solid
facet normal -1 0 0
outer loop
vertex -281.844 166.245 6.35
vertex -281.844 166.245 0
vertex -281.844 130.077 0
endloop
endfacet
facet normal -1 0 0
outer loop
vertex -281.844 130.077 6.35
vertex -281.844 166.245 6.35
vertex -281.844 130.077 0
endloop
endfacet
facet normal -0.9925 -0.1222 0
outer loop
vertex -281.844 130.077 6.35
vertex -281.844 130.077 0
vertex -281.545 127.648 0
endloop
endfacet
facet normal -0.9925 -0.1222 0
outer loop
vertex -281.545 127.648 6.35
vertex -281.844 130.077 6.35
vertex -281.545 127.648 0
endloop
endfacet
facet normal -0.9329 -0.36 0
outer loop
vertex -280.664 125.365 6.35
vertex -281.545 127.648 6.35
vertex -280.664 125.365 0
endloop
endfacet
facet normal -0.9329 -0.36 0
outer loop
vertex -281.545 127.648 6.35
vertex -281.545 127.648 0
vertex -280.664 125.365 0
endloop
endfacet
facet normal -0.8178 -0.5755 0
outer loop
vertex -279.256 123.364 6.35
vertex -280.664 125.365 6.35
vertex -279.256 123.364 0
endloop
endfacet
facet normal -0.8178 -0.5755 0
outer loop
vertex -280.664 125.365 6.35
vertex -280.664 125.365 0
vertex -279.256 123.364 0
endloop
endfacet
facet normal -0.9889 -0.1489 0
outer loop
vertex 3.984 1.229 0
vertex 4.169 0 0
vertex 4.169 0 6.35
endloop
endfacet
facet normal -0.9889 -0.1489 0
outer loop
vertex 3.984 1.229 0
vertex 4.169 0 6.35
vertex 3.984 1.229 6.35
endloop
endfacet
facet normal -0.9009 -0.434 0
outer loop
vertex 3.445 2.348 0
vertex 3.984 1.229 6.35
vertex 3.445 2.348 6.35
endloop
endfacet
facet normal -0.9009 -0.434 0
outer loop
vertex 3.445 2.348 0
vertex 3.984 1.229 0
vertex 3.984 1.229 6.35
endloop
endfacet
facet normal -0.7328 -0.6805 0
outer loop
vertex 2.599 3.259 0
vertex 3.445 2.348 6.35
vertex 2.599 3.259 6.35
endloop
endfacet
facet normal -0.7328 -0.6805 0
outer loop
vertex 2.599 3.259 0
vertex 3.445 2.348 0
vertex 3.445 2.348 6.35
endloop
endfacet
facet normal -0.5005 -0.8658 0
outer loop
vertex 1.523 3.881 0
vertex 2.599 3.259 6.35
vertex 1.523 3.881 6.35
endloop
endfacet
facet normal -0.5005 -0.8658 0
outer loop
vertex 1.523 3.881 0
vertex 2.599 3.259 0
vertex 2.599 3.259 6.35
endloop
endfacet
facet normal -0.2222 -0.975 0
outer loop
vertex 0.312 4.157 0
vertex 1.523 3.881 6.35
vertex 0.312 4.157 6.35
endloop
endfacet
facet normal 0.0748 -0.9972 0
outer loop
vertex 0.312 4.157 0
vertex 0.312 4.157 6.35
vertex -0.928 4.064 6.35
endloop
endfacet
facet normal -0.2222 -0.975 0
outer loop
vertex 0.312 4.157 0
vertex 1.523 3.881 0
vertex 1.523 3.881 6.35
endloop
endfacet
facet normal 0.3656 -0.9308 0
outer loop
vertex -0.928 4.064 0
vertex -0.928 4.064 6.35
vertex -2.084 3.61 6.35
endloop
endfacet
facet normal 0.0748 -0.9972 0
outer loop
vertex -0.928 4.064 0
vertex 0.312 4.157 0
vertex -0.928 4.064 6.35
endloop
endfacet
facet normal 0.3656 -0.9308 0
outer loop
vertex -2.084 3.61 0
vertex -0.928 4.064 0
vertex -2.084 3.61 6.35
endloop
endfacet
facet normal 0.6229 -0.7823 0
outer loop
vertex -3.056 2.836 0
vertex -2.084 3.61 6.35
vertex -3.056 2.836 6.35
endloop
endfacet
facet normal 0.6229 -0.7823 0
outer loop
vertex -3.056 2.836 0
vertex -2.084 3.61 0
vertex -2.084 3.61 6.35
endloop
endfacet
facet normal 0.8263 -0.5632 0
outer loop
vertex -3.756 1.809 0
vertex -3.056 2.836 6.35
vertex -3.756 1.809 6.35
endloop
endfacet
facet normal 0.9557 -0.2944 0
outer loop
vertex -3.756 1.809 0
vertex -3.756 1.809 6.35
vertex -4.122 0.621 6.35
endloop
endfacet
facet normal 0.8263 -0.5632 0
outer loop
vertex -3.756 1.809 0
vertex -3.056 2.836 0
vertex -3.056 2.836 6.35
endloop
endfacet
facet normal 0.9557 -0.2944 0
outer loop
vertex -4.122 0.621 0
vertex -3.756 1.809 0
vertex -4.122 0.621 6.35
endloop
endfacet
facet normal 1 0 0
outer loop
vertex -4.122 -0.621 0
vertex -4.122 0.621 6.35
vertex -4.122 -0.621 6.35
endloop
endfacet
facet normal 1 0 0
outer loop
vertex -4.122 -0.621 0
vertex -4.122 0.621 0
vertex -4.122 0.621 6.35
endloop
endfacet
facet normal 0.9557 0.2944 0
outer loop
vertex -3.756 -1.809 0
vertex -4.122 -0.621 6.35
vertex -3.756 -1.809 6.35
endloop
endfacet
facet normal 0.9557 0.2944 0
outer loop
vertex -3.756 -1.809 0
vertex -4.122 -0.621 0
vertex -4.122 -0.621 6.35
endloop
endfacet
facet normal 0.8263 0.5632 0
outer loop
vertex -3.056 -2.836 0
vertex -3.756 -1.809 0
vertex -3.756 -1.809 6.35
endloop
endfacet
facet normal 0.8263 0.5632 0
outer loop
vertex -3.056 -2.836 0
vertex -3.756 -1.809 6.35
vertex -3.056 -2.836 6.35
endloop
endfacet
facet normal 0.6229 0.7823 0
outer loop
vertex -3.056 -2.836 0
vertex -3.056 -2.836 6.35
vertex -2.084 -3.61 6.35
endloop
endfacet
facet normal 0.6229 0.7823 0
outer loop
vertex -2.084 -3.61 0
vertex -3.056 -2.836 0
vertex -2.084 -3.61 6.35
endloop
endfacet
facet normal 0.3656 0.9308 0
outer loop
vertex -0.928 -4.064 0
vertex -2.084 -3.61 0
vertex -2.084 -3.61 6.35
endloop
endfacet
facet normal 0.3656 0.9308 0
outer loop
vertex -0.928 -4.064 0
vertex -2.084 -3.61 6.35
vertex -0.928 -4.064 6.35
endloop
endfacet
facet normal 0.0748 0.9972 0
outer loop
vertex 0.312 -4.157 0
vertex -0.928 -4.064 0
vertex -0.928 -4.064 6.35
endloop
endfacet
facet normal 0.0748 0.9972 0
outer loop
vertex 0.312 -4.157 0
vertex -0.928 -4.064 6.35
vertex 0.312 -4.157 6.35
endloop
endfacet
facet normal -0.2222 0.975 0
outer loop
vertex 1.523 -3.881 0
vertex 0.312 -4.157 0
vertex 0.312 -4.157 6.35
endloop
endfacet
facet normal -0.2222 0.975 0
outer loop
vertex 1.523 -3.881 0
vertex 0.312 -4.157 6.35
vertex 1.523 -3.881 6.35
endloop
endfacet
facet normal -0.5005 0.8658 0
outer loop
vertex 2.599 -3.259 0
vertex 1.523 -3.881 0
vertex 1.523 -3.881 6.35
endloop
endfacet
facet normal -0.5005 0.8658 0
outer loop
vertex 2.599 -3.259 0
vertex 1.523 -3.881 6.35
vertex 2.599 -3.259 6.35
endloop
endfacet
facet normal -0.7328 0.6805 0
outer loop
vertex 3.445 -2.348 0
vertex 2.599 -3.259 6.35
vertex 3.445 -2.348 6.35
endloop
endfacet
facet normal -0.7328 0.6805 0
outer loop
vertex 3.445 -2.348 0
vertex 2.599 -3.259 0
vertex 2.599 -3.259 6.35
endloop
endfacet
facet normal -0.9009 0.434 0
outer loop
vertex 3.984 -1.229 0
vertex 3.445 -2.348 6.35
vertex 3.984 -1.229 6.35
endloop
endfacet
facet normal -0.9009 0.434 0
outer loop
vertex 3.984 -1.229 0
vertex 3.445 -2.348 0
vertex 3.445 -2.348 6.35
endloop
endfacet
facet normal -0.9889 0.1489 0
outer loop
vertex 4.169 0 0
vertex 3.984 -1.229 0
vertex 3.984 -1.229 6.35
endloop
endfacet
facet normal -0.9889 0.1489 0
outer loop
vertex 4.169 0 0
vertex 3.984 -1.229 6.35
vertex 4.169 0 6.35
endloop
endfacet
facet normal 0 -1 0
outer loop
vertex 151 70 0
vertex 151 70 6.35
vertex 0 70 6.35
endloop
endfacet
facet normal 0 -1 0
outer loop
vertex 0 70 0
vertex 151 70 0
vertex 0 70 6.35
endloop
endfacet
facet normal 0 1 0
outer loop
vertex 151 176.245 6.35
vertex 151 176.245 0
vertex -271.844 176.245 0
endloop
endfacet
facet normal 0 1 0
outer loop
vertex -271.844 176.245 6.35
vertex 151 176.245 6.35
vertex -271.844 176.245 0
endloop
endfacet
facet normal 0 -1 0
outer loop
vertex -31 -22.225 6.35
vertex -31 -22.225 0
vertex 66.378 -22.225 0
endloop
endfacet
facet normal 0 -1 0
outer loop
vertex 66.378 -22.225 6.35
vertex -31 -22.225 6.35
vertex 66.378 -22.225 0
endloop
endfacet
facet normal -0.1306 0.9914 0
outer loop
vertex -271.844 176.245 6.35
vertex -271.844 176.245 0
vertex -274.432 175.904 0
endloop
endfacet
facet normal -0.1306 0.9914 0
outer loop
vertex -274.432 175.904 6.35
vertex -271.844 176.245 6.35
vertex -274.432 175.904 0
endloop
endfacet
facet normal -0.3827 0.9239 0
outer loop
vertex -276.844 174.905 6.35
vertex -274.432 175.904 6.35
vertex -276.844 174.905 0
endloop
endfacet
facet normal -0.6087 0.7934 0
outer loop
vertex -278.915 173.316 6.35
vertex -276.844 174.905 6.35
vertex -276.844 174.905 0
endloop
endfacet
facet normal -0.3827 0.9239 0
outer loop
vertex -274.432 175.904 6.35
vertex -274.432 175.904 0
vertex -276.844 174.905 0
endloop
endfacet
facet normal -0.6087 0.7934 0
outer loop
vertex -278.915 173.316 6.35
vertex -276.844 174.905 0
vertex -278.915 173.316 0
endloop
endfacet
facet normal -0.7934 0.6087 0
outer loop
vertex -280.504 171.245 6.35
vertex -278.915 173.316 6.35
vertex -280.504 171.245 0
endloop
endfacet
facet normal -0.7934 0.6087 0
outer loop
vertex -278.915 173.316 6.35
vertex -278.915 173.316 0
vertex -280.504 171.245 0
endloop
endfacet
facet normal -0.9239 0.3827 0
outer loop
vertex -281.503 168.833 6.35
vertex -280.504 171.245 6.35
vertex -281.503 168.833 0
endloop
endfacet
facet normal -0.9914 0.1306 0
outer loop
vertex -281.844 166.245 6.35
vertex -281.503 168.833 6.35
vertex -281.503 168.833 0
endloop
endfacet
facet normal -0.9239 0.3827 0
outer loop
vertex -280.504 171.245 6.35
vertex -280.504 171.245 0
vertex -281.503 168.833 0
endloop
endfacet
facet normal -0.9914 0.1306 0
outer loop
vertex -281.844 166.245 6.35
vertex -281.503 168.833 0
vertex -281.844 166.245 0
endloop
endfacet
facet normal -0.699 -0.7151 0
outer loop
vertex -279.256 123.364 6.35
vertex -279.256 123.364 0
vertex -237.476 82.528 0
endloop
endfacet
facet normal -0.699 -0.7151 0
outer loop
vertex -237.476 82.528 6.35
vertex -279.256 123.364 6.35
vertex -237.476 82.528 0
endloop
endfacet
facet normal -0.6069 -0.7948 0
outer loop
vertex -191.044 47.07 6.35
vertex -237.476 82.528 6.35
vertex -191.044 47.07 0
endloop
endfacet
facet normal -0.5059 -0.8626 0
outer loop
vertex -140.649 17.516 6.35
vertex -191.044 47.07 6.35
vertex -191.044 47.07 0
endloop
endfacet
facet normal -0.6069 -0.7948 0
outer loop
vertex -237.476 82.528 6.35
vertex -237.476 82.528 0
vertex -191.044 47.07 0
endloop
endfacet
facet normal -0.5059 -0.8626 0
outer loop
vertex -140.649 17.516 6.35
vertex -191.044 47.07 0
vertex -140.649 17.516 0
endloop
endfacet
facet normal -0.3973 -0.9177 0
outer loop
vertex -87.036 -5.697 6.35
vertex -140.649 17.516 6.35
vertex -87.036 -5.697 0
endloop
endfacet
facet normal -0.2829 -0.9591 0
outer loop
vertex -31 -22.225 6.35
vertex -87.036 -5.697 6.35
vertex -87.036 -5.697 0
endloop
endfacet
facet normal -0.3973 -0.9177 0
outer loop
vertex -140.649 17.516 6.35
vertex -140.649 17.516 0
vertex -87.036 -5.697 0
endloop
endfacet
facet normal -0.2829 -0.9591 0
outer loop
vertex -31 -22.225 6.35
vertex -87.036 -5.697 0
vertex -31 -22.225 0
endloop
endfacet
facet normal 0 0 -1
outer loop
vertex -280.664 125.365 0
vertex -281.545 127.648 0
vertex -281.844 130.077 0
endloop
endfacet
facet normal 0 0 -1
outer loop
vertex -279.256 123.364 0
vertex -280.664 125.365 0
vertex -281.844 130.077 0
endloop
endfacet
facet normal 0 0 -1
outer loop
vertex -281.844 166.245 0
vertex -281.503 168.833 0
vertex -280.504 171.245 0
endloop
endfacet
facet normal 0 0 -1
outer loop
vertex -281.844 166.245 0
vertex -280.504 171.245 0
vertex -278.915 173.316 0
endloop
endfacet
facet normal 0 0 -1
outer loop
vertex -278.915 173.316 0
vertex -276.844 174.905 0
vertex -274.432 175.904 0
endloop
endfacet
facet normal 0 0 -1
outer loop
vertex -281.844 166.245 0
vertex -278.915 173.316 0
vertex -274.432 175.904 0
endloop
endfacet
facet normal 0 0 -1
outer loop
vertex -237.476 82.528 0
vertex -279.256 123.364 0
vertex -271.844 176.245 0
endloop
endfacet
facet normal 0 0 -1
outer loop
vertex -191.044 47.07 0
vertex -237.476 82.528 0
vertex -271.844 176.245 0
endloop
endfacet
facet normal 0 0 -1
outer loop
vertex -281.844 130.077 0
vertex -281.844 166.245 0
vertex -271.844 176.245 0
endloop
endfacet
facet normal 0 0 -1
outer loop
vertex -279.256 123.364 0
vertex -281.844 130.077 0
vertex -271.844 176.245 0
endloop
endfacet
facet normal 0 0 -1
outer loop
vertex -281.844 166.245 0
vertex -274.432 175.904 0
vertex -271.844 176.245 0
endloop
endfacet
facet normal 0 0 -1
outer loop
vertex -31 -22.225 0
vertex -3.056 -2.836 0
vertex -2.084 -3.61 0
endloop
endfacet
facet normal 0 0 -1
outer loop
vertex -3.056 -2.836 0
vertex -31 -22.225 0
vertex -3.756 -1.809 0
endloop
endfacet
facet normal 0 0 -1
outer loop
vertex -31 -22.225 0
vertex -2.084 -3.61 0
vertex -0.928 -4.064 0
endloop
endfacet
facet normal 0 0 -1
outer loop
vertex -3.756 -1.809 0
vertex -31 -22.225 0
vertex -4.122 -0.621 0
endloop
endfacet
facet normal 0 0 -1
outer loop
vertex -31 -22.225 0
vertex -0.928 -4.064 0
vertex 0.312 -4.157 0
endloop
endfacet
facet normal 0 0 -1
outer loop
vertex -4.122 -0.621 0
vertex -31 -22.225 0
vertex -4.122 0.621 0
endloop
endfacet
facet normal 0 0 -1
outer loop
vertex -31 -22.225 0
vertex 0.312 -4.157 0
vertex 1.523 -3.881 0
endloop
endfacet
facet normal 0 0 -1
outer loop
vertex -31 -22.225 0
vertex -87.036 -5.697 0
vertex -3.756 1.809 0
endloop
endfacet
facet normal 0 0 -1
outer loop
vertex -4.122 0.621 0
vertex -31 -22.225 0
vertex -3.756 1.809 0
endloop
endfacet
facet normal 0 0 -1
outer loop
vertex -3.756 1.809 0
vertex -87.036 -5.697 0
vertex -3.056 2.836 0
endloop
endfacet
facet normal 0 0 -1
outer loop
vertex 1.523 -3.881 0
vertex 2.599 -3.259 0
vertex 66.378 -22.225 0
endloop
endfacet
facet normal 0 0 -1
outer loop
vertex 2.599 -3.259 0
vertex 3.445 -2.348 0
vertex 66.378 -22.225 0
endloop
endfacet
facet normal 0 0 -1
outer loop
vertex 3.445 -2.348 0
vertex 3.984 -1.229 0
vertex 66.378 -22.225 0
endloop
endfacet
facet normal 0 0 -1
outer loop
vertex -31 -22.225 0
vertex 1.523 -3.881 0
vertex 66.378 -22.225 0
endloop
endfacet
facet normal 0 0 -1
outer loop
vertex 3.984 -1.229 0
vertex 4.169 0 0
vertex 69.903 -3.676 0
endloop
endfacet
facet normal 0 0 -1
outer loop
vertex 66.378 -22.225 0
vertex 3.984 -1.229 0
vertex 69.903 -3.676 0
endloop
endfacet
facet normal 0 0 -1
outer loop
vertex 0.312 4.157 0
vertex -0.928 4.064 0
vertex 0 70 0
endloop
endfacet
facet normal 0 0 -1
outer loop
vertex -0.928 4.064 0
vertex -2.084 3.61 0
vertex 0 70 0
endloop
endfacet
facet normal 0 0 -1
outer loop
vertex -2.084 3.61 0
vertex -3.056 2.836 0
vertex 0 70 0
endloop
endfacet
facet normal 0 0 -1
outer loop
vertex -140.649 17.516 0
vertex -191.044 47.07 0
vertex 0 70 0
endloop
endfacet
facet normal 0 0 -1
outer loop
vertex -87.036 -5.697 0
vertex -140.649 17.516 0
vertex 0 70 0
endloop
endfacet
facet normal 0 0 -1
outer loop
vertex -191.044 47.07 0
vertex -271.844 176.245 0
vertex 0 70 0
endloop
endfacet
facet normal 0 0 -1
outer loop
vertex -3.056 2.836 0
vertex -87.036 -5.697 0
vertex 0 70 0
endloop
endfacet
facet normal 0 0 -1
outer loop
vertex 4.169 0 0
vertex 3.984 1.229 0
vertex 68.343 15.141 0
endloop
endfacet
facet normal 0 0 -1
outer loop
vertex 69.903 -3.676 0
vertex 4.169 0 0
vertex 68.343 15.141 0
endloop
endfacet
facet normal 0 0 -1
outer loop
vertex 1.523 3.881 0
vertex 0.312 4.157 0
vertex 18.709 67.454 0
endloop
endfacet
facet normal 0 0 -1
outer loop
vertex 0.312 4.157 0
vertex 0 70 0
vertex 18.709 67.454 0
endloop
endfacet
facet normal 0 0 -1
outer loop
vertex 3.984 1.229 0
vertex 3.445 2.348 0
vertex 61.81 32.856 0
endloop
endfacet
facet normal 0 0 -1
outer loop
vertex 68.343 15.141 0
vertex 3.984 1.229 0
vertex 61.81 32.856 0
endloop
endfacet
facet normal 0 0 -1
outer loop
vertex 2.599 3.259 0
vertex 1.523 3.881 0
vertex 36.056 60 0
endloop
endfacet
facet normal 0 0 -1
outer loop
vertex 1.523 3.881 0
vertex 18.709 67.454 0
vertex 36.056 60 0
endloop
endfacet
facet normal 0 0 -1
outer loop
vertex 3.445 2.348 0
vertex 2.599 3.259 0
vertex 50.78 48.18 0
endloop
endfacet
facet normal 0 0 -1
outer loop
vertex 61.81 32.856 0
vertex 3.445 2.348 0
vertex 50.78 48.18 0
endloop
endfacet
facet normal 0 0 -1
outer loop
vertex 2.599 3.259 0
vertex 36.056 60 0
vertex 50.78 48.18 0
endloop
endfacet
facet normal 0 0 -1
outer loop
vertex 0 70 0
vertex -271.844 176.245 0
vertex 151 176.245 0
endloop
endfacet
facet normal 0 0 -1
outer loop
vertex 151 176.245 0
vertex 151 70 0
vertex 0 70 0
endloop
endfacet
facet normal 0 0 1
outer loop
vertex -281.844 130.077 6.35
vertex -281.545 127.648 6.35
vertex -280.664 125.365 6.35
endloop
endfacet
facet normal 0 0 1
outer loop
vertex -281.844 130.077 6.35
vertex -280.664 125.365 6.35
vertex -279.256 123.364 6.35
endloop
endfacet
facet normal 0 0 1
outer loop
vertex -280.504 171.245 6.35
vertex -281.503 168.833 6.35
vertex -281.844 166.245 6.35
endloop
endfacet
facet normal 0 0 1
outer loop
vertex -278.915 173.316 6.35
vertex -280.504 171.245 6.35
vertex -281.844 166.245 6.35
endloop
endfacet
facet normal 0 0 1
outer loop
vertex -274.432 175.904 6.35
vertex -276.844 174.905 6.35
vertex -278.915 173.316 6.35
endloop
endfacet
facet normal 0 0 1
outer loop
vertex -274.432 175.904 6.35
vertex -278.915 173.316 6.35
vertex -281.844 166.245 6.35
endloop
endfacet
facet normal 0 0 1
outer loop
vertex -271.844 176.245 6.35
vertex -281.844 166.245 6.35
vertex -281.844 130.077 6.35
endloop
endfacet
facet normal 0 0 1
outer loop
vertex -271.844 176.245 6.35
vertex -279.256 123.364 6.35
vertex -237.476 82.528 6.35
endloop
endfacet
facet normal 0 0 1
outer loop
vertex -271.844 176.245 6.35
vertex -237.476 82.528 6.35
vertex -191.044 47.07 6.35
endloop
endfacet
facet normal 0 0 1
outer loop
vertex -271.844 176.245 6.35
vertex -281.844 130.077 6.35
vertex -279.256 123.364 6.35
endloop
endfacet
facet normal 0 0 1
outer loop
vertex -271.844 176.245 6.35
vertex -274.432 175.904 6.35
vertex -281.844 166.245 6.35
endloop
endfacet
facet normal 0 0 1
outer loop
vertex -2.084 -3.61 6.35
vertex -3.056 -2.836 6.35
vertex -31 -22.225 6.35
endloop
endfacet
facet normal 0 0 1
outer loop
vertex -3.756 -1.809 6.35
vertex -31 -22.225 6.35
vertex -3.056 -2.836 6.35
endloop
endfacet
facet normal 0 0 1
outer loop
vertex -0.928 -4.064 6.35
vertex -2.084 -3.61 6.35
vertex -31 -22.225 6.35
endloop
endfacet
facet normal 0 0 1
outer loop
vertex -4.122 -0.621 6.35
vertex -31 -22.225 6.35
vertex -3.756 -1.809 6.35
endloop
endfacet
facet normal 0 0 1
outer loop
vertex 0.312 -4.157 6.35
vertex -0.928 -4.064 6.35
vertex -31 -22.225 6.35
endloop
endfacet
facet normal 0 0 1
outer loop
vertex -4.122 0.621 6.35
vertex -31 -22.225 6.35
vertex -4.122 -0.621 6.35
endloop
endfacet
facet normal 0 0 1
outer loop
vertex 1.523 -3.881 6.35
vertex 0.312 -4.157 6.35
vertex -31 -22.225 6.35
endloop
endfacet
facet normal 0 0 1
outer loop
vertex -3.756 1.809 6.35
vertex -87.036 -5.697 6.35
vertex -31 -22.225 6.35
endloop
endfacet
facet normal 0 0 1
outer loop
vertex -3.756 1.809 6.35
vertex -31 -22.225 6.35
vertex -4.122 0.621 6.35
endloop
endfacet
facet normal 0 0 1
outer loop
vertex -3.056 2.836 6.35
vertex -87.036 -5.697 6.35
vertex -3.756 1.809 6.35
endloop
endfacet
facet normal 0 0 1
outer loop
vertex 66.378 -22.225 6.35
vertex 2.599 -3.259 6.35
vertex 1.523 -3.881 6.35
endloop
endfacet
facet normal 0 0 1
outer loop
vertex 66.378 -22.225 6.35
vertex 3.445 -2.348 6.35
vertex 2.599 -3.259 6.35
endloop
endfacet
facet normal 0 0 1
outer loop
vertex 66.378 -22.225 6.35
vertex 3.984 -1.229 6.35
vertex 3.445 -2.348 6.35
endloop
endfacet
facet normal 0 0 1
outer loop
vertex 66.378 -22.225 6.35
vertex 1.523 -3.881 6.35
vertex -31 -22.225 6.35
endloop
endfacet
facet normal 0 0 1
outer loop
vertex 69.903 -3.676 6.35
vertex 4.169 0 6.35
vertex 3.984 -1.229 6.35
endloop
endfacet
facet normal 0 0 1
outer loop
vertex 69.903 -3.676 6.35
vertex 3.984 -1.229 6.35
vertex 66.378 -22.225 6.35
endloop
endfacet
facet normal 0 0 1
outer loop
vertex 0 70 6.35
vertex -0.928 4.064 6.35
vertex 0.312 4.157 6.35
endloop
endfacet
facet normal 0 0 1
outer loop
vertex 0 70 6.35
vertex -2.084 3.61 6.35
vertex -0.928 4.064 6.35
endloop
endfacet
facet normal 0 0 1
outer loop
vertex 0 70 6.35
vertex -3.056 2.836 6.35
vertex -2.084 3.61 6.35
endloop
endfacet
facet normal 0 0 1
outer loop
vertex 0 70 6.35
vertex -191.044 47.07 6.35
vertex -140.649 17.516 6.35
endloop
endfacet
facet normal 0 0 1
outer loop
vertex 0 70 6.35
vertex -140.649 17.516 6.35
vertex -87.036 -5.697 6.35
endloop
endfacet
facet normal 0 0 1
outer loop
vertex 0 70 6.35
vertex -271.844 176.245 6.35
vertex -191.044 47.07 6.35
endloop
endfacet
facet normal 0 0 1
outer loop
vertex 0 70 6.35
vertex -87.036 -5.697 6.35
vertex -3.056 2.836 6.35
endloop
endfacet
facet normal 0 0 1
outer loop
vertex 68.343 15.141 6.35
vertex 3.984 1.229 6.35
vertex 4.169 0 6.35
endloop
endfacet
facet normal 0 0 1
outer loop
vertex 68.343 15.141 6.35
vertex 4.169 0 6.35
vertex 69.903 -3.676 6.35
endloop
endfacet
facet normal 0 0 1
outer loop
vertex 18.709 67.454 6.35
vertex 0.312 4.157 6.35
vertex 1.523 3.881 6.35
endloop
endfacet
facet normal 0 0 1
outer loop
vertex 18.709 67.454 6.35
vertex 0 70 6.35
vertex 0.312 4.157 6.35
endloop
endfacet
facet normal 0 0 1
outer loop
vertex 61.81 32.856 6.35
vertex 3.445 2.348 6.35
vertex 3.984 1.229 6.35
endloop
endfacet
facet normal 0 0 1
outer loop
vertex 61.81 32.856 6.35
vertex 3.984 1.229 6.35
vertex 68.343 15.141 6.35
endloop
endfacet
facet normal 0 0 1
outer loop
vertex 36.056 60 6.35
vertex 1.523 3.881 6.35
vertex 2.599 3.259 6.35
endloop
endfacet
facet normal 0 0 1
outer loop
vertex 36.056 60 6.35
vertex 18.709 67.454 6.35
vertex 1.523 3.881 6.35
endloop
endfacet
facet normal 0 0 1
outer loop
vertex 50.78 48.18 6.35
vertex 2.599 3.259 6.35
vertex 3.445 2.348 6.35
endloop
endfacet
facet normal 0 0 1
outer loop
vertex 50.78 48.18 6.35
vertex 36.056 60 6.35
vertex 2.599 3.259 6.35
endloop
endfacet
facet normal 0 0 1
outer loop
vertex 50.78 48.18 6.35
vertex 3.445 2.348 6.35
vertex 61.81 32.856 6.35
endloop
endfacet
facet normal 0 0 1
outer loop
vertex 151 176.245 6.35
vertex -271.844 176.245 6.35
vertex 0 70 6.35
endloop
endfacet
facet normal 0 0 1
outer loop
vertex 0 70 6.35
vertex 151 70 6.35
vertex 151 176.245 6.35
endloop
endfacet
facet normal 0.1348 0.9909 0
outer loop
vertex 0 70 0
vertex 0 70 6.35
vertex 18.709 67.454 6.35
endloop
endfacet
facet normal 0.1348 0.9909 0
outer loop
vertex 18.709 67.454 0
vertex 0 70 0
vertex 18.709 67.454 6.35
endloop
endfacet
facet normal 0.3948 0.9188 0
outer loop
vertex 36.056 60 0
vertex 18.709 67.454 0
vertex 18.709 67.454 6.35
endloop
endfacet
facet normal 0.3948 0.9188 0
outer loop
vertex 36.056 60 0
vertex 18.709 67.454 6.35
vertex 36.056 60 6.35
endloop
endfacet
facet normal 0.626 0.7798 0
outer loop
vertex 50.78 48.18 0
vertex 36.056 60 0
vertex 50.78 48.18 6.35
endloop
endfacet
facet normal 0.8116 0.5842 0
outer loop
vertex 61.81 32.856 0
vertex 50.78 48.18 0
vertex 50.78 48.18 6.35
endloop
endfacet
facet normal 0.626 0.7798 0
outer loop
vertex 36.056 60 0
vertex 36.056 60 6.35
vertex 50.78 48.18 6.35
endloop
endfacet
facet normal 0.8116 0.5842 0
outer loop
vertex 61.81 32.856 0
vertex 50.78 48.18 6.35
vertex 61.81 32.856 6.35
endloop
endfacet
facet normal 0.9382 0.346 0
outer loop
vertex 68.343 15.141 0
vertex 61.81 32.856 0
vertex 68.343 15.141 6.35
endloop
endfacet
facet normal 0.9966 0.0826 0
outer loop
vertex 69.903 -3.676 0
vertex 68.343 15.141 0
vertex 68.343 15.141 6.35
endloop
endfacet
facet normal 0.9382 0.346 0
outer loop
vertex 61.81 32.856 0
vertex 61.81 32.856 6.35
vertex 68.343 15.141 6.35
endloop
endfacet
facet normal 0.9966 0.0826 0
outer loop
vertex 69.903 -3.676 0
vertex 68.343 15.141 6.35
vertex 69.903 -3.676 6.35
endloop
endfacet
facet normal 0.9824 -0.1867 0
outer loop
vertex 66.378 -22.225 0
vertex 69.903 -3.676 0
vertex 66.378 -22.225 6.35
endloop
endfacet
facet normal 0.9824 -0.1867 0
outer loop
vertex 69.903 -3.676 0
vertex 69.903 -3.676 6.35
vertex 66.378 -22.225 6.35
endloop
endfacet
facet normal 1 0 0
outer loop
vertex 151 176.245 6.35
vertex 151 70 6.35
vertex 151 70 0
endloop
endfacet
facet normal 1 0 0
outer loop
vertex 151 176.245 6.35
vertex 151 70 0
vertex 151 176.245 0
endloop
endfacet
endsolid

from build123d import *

# Parameters (mm, degrees)
CROQUIS1_W              = 62
CROQUIS1_H              = 44.45
CROQUIS1_R              = 4.168993309
SALIENTE_EXTRUIR1_DEPTH = 6.35
CORTAR_EXTRUIR1_DEPTH   = 6.35
CROQUIS4_W              = 501.85323645
CROQUIS4_H              = 287.183942178
CORTAR_EXTRUIR2_DEPTH   = 6.35


with BuildPart() as part:
    # Croquis1 → Saliente-Extruir1 (new body)
    # profile 1 of 2: a face of its own
    with BuildSketch(Plane.XY):
        with BuildLine():
            Line((31, 22.225), (31, -22.225))
            Line((31, -22.225), (333, -22.225))
            ThreePointArc((333, -22.225), (468.296416477, 31.525514455), (581.256141711, 123.364169664))
            ThreePointArc((581.256141711, 123.364169664), (583.174687818, 126.479763895), (583.844075147, 130.076938784))
            Line((583.844075147, 130.076938784), (583.844075147, 166.244969995))
            ThreePointArc((583.844075147, 166.244969995), (580.915142959, 173.316037807), (573.844075147, 176.244969995))
            Line((573.844075147, 176.244969995), (-271.844075147, 176.244969995))
            ThreePointArc((-271.844075147, 176.244969995), (-278.915142959, 173.316037807), (-281.844075147, 166.244969995))
            Line((-281.844075147, 166.244969995), (-281.844075147, 130.076938784))
            ThreePointArc((-281.844075147, 130.076938784), (-281.174687818, 126.479763895), (-279.256141711, 123.364169664))
            ThreePointArc((-279.256141711, 123.364169664), (-166.296416477, 31.525514455), (-31, -22.225))
            Line((-31, -22.225), (-31, 22.225))
            Line((-31, 22.225), (31, 22.225))
        make_face()
    # profile 2 of 2: a face of its own
    with BuildSketch(Plane.XY):
        Rectangle(CROQUIS1_W, CROQUIS1_H)
        Circle(CROQUIS1_R, mode=Mode.SUBTRACT)
    extrude(amount=SALIENTE_EXTRUIR1_DEPTH)

    # Croquis3 → Cortar-Extruir1 (cut)
    with BuildSketch(Plane.XY.offset(6.35)):
        with BuildLine():
            Line((151, -22.225), (151, 70))
            Line((151, 70), (0, 70))
            ThreePointArc((0, 70), (56.814390783, 40.891625059), (66.378079025, -22.225))
            Line((66.378079025, -22.225), (151, -22.225))
        make_face()
        with BuildLine():
            Line((302, 70), (151, 70))
            Line((151, 70), (151, -22.225))
            Line((151, -22.225), (235.621920975, -22.225))
            ThreePointArc((235.621920975, -22.225), (245.185609217, 40.891625059), (302, 70))
        make_face()
    extrude(amount=-CORTAR_EXTRUIR1_DEPTH, mode=Mode.SUBTRACT)

    # Croquis4 → Cortar-Extruir2 (cut)
    with BuildSketch(Plane.XY.offset(6.35)):
        with Locations((401.926618225, 32.652998906)):
            Rectangle(CROQUIS4_W, CROQUIS4_H)
    extrude(amount=-CORTAR_EXTRUIR2_DEPTH, mode=Mode.SUBTRACT)


solid = part.part
